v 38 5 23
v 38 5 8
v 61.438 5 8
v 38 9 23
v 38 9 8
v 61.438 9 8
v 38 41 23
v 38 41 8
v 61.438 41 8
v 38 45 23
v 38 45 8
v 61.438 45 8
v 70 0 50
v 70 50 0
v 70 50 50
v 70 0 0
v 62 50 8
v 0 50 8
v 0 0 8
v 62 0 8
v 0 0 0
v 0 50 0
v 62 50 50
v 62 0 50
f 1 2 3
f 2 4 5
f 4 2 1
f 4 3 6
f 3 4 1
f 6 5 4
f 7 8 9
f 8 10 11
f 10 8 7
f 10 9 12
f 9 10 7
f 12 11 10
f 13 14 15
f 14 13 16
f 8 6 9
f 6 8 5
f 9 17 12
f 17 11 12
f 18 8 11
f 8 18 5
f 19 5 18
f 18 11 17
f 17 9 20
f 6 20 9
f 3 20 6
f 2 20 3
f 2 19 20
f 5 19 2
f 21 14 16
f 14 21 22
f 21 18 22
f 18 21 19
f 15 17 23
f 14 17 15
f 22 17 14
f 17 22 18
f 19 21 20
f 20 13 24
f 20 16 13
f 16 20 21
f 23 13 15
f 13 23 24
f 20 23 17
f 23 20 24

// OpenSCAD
$fn = 32;

// ----------------------------------------------------------------------
// Rib bracket: 2-gusset L bracket
// ----------------------------------------------------------------------

// --- parameters (mm) ---
base_l = 70;              // foot length, X
base_w = 50;              // foot width, Y
base_t = 8;               // foot thickness
plate_t = 8;              // upright plate thickness
plate_h = 50;             // overall height
gus_l = 24;               // gusset leg along the foot
gus_h = 16;               // gusset height
gus_t = 4;                // gusset thickness
gus_edge = 5;             // gusset margin from the foot edge
n_gus = 2;                // gusset count
fit_tol = 0.02;           // tolerance for press fits, mm
free_tol = 0.2;           // tolerance for clearance fits, mm

gus_pitch = (base_w - 2 * gus_edge - gus_t) / (n_gus - 1);  // gusset pitch

union() {
  cube([base_l, base_w, base_t]);
  translate([base_l - plate_t, 0, base_t - 1])
    cube([plate_t, base_w, plate_h - base_t + 1]);
  for (i = [0 : n_gus - 1])
    translate([base_l - plate_t - gus_l, gus_edge + i * gus_pitch, base_t - 1])
      rotate([-90, 0, 0])
        linear_extrude(height = gus_t)
          polygon(points = [[0, 0], [gus_l + 1, 0], [0, -gus_h]]);
}
